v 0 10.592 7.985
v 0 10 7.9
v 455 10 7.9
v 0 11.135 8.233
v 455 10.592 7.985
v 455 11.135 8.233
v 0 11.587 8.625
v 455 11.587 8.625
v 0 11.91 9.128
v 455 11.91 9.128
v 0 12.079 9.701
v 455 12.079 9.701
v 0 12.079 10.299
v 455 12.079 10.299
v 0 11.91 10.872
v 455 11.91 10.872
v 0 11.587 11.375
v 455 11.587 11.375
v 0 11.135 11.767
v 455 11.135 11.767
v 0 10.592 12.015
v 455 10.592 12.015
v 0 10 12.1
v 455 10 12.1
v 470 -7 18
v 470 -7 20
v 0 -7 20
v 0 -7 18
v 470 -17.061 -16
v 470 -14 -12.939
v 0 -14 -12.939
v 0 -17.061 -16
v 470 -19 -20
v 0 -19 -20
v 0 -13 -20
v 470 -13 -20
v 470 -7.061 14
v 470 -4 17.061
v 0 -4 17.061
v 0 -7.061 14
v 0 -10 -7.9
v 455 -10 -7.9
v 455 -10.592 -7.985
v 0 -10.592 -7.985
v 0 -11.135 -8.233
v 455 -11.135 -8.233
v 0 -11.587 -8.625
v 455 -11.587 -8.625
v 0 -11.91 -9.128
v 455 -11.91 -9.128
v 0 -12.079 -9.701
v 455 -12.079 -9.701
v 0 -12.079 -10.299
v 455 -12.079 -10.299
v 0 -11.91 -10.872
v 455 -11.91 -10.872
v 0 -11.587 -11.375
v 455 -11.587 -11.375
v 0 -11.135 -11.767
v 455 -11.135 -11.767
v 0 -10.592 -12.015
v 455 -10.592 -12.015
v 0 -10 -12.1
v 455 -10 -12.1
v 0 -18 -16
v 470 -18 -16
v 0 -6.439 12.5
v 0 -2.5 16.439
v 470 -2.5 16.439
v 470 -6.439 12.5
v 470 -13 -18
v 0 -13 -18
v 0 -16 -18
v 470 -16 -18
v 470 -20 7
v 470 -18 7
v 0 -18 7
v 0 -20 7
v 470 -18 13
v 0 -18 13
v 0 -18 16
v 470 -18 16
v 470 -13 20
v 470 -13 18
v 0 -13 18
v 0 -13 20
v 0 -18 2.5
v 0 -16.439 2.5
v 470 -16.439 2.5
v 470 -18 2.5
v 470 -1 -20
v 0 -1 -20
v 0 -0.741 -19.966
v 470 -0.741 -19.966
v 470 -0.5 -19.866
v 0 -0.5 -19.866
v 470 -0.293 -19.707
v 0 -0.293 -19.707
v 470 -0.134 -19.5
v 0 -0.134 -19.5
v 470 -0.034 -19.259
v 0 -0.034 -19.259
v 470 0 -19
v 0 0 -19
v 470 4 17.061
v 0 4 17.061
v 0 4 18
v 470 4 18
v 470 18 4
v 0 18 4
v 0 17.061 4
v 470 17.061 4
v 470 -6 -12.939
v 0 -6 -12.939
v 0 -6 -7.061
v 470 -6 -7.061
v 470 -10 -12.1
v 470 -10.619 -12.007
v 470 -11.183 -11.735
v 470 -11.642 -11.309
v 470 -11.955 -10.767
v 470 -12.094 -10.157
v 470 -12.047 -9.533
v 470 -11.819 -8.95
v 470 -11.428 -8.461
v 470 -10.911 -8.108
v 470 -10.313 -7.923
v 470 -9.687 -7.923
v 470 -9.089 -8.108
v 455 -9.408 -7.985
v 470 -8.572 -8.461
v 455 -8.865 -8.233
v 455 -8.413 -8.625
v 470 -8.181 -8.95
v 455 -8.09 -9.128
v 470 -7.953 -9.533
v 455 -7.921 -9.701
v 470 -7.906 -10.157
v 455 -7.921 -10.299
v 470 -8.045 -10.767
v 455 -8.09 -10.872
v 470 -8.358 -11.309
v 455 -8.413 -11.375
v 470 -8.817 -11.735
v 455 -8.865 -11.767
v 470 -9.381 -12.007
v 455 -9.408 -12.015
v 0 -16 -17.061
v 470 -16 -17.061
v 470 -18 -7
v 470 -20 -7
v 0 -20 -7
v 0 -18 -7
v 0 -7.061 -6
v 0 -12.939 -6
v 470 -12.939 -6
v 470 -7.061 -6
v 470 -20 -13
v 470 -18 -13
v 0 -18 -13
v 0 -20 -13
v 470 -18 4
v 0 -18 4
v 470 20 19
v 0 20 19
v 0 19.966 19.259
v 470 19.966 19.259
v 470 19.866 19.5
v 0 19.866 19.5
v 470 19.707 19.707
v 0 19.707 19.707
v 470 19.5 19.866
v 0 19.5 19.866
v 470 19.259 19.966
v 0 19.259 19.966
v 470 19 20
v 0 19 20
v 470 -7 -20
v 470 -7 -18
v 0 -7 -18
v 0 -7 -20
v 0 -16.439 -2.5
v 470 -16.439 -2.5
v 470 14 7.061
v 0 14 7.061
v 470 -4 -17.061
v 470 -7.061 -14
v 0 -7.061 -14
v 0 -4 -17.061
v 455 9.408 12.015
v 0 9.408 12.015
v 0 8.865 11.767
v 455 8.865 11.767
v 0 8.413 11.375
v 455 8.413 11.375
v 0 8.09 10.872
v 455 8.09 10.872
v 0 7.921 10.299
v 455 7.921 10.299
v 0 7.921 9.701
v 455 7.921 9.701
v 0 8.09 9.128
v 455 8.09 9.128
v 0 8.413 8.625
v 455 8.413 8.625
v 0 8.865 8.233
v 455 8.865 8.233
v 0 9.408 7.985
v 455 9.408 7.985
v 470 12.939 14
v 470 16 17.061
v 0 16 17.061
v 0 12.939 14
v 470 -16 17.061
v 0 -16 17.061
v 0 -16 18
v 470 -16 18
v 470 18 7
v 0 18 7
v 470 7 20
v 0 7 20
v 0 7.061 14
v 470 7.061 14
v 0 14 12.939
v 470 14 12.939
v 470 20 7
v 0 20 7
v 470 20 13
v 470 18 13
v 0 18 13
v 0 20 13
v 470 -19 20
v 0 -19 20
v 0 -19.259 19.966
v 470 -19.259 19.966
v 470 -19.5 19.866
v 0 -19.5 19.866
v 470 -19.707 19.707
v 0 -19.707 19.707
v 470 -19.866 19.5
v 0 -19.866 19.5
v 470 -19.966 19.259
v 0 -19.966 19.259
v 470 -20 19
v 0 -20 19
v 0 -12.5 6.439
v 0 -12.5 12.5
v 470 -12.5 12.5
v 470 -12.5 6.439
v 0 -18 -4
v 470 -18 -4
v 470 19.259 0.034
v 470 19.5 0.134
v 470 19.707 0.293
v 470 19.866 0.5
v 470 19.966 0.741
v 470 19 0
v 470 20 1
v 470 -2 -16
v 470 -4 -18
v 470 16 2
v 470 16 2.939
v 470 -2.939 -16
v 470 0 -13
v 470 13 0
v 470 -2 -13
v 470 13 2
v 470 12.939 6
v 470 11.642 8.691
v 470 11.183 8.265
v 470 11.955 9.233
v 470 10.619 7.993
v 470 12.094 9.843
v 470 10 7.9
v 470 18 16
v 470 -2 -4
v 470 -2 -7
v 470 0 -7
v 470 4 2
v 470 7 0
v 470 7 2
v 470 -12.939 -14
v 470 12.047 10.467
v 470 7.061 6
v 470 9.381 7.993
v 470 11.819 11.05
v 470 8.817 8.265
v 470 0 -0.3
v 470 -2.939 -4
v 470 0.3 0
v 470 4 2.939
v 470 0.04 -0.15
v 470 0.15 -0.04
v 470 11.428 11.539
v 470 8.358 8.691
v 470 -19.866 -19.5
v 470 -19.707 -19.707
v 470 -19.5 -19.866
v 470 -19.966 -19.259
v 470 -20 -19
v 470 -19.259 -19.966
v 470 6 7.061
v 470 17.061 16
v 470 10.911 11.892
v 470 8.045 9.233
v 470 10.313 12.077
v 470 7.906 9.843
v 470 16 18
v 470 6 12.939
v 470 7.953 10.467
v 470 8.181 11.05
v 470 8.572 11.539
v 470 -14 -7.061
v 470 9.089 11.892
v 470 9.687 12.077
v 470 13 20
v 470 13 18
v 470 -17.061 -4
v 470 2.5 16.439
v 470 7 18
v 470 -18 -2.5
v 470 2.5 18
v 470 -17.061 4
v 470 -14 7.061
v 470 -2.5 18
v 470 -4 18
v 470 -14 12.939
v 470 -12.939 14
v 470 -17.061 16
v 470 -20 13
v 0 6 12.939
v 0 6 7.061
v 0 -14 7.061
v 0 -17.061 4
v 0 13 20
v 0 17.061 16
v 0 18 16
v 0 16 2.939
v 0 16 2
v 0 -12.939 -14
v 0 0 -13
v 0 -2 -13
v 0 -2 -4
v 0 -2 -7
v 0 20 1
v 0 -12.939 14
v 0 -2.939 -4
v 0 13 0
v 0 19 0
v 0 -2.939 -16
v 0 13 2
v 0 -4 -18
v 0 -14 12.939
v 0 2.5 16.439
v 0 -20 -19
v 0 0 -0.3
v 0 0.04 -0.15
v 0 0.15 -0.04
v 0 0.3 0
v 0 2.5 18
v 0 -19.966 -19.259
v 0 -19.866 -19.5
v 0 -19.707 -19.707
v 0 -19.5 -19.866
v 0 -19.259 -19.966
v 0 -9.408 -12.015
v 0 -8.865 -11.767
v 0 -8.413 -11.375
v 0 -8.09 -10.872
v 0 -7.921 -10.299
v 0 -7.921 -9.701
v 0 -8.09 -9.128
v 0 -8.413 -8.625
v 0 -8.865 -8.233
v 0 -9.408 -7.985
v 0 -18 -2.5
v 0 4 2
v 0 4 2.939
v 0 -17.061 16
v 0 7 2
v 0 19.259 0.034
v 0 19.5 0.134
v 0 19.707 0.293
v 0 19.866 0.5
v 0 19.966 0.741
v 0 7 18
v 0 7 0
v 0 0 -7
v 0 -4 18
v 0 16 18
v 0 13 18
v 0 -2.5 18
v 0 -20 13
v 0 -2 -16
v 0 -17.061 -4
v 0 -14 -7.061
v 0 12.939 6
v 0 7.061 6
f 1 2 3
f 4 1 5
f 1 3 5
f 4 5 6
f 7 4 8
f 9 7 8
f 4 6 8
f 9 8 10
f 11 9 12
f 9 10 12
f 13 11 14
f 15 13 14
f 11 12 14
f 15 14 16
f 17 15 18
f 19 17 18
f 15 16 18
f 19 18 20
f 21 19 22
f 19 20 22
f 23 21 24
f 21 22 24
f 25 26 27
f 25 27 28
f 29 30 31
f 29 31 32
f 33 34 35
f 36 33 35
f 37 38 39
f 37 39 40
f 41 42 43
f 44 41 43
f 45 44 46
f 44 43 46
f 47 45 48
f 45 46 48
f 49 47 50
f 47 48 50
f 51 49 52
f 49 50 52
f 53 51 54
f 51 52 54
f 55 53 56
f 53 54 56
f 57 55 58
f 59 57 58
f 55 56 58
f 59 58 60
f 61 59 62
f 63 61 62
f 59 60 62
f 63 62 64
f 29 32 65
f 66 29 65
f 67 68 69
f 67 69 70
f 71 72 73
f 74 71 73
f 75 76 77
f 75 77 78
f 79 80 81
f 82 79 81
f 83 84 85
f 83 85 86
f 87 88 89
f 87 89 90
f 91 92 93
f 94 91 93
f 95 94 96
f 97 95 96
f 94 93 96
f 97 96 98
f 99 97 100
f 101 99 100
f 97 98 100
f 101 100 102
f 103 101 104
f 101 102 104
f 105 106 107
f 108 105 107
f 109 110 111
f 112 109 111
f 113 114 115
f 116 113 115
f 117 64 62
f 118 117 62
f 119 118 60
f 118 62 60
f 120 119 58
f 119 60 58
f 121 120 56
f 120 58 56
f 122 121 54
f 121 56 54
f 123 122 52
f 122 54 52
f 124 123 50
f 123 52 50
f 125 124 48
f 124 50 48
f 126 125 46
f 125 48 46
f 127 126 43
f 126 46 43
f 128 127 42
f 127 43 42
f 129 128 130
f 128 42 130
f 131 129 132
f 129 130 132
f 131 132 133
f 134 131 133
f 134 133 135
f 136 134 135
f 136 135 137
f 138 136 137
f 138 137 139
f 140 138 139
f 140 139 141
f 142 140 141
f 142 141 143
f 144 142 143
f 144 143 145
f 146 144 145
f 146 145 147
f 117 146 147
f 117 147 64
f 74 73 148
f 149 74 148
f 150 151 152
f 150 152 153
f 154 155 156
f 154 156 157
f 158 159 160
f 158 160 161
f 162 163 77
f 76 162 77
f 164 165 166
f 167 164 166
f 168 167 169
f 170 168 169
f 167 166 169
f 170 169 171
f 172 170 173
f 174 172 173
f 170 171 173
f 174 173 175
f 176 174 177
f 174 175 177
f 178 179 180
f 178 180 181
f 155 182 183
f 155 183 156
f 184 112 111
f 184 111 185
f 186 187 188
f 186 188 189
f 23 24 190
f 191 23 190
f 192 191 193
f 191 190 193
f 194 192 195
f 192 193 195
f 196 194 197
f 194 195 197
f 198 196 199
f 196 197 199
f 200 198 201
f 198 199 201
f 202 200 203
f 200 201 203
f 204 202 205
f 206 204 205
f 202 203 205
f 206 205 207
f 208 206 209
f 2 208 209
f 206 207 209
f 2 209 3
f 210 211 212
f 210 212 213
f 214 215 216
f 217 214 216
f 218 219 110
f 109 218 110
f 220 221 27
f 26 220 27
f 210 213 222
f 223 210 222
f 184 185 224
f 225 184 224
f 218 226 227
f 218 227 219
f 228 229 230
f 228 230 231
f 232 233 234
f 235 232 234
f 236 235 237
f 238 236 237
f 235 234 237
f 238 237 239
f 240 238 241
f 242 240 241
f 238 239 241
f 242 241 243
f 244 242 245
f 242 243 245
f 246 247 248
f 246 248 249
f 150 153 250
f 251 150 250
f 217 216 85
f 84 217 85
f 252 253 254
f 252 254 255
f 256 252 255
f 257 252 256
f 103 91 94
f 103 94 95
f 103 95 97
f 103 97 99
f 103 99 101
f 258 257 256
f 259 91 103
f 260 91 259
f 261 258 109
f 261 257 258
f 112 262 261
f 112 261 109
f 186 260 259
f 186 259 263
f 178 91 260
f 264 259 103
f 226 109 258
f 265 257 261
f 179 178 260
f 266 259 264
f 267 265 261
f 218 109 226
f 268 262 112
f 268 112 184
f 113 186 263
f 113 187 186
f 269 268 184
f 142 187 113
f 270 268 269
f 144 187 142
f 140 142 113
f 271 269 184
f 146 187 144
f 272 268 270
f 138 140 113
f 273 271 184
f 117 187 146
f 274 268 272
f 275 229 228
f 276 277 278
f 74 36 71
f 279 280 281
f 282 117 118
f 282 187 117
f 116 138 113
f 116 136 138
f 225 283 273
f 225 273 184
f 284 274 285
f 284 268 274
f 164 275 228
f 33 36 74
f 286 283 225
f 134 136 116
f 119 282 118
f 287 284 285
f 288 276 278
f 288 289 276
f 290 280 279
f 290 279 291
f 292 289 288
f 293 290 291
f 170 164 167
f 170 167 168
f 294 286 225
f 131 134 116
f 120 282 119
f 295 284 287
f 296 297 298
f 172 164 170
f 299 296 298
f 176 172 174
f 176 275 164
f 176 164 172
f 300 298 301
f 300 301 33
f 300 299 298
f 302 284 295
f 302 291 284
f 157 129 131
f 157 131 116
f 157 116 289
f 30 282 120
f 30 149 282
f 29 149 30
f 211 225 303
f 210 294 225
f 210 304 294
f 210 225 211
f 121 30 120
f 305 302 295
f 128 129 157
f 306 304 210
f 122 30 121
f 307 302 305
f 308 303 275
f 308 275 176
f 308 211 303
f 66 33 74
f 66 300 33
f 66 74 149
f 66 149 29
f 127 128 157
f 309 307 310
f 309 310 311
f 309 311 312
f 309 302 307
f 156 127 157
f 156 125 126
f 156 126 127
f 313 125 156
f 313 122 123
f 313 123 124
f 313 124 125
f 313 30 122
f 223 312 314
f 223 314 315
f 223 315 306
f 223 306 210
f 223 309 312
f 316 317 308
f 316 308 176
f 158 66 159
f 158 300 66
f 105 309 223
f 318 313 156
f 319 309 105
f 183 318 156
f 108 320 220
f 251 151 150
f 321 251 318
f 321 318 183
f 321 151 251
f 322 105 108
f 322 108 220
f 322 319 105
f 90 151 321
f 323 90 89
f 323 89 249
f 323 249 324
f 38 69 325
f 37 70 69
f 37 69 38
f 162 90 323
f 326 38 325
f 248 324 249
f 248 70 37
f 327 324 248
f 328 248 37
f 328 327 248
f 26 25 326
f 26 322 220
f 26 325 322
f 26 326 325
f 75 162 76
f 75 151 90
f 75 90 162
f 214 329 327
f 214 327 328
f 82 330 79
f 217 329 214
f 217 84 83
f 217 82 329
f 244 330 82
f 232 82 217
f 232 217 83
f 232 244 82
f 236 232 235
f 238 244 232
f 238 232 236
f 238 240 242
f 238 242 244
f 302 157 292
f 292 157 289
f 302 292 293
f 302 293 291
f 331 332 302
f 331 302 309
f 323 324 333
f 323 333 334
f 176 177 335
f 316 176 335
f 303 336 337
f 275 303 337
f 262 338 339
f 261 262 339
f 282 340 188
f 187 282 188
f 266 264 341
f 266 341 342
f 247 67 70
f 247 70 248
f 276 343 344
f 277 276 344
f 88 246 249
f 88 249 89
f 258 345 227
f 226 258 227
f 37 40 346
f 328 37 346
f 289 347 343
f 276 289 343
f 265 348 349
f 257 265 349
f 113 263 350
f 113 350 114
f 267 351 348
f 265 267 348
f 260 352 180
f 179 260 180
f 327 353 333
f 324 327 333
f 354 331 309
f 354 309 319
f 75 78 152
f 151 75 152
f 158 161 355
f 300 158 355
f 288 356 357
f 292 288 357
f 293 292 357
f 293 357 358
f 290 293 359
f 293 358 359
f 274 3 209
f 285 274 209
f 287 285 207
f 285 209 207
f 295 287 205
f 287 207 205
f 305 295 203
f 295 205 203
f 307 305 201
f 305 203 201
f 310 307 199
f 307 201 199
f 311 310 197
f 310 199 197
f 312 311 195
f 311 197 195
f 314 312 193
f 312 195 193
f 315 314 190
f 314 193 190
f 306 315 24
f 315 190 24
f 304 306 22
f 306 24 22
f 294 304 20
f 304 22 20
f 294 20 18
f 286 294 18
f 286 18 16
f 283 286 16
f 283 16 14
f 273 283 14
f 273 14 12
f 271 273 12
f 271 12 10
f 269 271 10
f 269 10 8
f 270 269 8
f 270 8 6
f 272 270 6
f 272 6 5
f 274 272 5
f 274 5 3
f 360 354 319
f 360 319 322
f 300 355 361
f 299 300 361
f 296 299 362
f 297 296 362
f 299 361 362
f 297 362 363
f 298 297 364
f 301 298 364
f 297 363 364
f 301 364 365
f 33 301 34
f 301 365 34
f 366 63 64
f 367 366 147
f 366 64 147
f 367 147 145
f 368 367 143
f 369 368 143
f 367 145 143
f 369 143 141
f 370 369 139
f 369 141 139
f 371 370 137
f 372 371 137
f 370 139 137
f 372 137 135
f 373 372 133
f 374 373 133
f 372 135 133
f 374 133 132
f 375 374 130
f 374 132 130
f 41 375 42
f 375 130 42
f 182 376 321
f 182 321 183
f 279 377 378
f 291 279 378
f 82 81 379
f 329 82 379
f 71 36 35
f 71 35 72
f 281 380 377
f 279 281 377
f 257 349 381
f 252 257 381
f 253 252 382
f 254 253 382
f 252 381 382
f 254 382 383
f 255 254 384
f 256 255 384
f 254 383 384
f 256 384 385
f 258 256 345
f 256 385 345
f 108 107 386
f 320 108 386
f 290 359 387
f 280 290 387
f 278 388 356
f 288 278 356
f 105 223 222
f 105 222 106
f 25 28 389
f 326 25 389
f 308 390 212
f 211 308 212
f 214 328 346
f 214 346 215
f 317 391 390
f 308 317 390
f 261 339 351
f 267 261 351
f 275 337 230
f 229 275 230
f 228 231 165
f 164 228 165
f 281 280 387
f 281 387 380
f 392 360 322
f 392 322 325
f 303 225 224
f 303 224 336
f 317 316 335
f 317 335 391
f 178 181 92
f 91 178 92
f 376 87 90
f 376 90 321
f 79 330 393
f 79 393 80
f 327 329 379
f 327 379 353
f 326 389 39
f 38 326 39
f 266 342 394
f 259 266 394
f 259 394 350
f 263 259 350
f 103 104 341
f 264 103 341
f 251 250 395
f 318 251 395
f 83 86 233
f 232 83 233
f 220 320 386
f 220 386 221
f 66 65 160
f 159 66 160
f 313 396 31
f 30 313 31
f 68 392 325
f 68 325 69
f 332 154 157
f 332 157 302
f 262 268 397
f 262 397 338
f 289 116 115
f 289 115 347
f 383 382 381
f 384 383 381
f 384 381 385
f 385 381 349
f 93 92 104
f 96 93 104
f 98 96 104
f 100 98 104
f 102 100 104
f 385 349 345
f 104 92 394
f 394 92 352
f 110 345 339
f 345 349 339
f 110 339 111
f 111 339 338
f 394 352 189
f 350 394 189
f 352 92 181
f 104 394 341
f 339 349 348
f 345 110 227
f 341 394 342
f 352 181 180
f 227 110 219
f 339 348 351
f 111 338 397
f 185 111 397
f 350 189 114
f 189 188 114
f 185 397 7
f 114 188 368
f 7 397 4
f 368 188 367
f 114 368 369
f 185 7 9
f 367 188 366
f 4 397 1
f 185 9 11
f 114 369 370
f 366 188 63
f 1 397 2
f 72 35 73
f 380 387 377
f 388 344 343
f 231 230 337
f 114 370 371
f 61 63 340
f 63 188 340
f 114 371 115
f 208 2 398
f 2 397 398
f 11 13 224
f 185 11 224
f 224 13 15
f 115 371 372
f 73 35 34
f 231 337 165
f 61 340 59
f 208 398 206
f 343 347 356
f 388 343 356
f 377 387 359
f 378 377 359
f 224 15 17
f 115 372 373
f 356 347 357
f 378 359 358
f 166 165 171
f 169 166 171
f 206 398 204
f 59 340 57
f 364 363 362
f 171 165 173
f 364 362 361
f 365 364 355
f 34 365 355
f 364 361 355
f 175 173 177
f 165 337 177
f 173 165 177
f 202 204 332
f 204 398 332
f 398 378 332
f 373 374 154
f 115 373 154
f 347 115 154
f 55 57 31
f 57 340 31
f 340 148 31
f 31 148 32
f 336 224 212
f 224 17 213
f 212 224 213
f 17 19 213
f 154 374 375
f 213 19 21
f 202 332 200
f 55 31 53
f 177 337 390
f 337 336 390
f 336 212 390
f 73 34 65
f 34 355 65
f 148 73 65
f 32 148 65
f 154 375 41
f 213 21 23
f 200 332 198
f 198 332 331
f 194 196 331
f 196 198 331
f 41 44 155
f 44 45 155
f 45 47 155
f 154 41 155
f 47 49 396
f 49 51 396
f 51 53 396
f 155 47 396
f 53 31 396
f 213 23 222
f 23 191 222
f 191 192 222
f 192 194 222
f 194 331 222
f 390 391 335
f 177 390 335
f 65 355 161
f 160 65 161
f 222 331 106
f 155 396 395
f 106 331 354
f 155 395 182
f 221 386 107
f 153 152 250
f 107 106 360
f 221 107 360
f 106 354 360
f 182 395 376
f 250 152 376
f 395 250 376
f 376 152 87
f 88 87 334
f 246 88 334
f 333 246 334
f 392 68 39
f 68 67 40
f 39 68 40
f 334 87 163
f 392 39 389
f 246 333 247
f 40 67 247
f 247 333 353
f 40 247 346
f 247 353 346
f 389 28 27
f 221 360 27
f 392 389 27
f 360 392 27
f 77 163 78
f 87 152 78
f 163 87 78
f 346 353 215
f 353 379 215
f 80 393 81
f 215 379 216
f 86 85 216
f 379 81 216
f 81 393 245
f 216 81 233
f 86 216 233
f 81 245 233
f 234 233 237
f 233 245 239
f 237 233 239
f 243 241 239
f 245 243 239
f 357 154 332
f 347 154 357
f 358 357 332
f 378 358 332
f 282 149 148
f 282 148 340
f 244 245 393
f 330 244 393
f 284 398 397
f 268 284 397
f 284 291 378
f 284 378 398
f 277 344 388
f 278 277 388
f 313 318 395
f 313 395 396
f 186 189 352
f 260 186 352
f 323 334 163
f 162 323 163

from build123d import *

# Parameters (mm, degrees)
SKETCH1_R           = 2.1
BOSS_EXTRUDE1_DEPTH = 470
SKETCH10_R          = 2.1
BOSS_EXTRUDE4_DEPTH = 15
BOSS_EXTRUDE5_START = -15
SKETCH11_R          = 2.1
BOSS_EXTRUDE5_DEPTH = 15
TAPPED_HOLE3_D      = 4.2
TAPPED_HOLE3_DEPTH  = 15
TAPPED_HOLE4_D      = 4.2


with BuildPart() as part:
    # Sketch1 → Boss-Extrude1 (new body)
    with BuildSketch(Plane(origin=(0, 0, 0), x_dir=(0, 0, -1), z_dir=(1, 0, 0))):
        with BuildLine():
            Line((-13, 18), (-13, 20))
            Line((-13, 20), (-19, 20))
            ThreePointArc((-19, 20), (-19.707106781, 19.707106781), (-20, 19))
            Line((-20, 19), (-20, 13))
            Line((-20, 13), (-18, 13))
            Line((-18, 13), (-18, 16))
            Line((-18, 16), (-17.060660172, 16))
            Line((-17.060660172, 16), (-14, 12.939339828))
            Line((-14, 12.939339828), (-14, 7.060660172))
            Line((-14, 7.060660172), (-17.060660172, 4))
            Line((-17.060660172, 4), (-18, 4))
            Line((-18, 4), (-18, 7))
            Line((-18, 7), (-20, 7))
            Line((-20, 7), (-20, -7))
            Line((-20, -7), (-18, -7))
            Line((-18, -7), (-18, -4))
            Line((-18, -4), (-17.060660172, -4))
            Line((-17.060660172, -4), (-14, -7.060660172))
            Line((-14, -7.060660172), (-14, -12.939339828))
            Line((-14, -12.939339828), (-17.060660172, -16))
            Line((-17.060660172, -16), (-18, -16))
            Line((-18, -16), (-18, -13))
            Line((-18, -13), (-20, -13))
            Line((-20, -13), (-20, -19))
            ThreePointArc((-20, -19), (-19.707106781, -19.707106781), (-19, -20))
            Line((-19, -20), (-13, -20))
            Line((-13, -20), (-13, -18))
            Line((-13, -18), (-16, -18))
            Line((-16, -18), (-16, -17.060660172))
            Line((-16, -17.060660172), (-12.939339828, -14))
            Line((-12.939339828, -14), (-7.060660172, -14))
            Line((-7.060660172, -14), (-4, -17.060660172))
            Line((-4, -17.060660172), (-4, -18))
            Line((-4, -18), (-7, -18))
            Line((-7, -18), (-7, -20))
            Line((-7, -20), (7, -20))
            Line((7, -20), (7, -18))
            Line((7, -18), (4, -18))
            Line((4, -18), (4, -17.060660172))
            Line((4, -17.060660172), (7.060660172, -14))
            Line((7.060660172, -14), (12.939339828, -14))
            Line((12.939339828, -14), (16, -17.060660172))
            Line((16, -17.060660172), (16, -18))
            Line((16, -18), (13, -18))
            Line((13, -18), (13, -20))
            Line((13, -20), (19, -20))
            ThreePointArc((19, -20), (19.707106781, -19.707106781), (20, -19))
            Line((20, -19), (20, -13))
            Line((20, -13), (18, -13))
            Line((18, -13), (18, -16))
            Line((18, -16), (17.060660172, -16))
            Line((17.060660172, -16), (14, -12.939339828))
            Line((14, -12.939339828), (14, -7.060660172))
            Line((14, -7.060660172), (17.060660172, -4))
            Line((17.060660172, -4), (18, -4))
            Line((18, -4), (18, -7))
            Line((18, -7), (20, -7))
            Line((20, -7), (20, -1))
            ThreePointArc((20, -1), (19.707106781, -0.292893219), (19, 0))
            Line((19, 0), (13, 0))
            Line((13, 0), (13, -2))
            Line((13, -2), (16, -2))
            Line((16, -2), (16, -2.939339828))
            Line((16, -2.939339828), (12.939339828, -6))
            Line((12.939339828, -6), (7.060660172, -6))
            Line((7.060660172, -6), (4, -2.939339828))
            Line((4, -2.939339828), (4, -2))
            Line((4, -2), (7, -2))
            Line((7, -2), (7, 0))
            Line((7, 0), (0.3, 0))
            ThreePointArc((0.3, 0), (0.087867966, 0.087867966), (0, 0.3))
            Line((0, 0.3), (0, 7))
            Line((0, 7), (-2, 7))
            Line((-2, 7), (-2, 4))
            Line((-2, 4), (-2.939339828, 4))
            Line((-2.939339828, 4), (-6, 7.060660172))
            Line((-6, 7.060660172), (-6, 12.939339828))
            Line((-6, 12.939339828), (-2.939339828, 16))
            Line((-2.939339828, 16), (-2, 16))
            Line((-2, 16), (-2, 13))
            Line((-2, 13), (0, 13))
            Line((0, 13), (0, 19))
            ThreePointArc((0, 19), (-0.292893219, 19.707106781), (-1, 20))
            Line((-1, 20), (-7, 20))
            Line((-7, 20), (-7, 18))
            Line((-7, 18), (-4, 18))
            Line((-4, 18), (-4, 17.060660172))
            Line((-4, 17.060660172), (-7.060660172, 14))
            Line((-7.060660172, 14), (-12.939339828, 14))
            Line((-12.939339828, 14), (-16, 17.060660172))
            Line((-16, 17.060660172), (-16, 18))
            Line((-16, 18), (-13, 18))
        make_face()
        with Locations(Location((10, -10, 0), (0, 0, 180))):
            Circle(SKETCH1_R, mode=Mode.SUBTRACT)
        with Locations(Location((-10, 10, 0), (0, 0, 180))):
            Circle(SKETCH1_R, mode=Mode.SUBTRACT)
        Polygon((6, -7.060660172), (-7.060660172, 6), (-12.939339828, 6), (-16.439339828, 2.5), (-18, 2.5), (-18, -2.5), (-16.439339828, -2.5), (-12.5, -6.439339828), (-12.5, -12.5), (-6.439339828, -12.5), (-2.5, -16.439339828), (-2.5, -18), (2.5, -18), (2.5, -16.439339828), (6, -12.939339828), align=None, mode=Mode.SUBTRACT)
    extrude(amount=BOSS_EXTRUDE1_DEPTH)

    # Sketch10 → Boss-Extrude4 (add)
    with BuildSketch(Plane(origin=(0, 0, 0), x_dir=(0, 0, -1), z_dir=(1, 0, 0))):
        with Locations(Location((10, -10, 0), (0, 0, 180))):
            Circle(SKETCH10_R)
        with Locations(Location((-10, 10, 0), (0, 0, 180))):
            Circle(SKETCH10_R)
    extrude(amount=BOSS_EXTRUDE4_DEPTH)

    # Sketch11 → Boss-Extrude5 (add)
    with BuildSketch(Plane(origin=(470, 0, 0), x_dir=(0, 0, -1), z_dir=(1, 0, 0)).offset(BOSS_EXTRUDE5_START)):
        with Locations(Location((10, -10, 0), (0, 0, 180))):
            Circle(SKETCH11_R)
        with Locations(Location((-10, 10, 0), (0, 0, 180))):
            Circle(SKETCH11_R)
    extrude(amount=BOSS_EXTRUDE5_DEPTH)

    # Tapped Hole3
    with Locations(Plane(origin=(0, 0, 42.543082138), x_dir=(0, 0, -1), z_dir=(-1, 0, 0))):
        with Locations((52.543082138, 10), (32.543082138, -10)):
            Hole(TAPPED_HOLE3_D / 2, depth=TAPPED_HOLE3_DEPTH)

    # Tapped Hole4 (through all)
    with Locations(Plane(origin=(470, 0, -41.216277394), x_dir=(0, 0, 1), z_dir=(1, 0, 0))):
        with Locations((51.216277394, -10), (31.216277394, 10)):
            Hole(TAPPED_HOLE4_D / 2)


solid = part.part
